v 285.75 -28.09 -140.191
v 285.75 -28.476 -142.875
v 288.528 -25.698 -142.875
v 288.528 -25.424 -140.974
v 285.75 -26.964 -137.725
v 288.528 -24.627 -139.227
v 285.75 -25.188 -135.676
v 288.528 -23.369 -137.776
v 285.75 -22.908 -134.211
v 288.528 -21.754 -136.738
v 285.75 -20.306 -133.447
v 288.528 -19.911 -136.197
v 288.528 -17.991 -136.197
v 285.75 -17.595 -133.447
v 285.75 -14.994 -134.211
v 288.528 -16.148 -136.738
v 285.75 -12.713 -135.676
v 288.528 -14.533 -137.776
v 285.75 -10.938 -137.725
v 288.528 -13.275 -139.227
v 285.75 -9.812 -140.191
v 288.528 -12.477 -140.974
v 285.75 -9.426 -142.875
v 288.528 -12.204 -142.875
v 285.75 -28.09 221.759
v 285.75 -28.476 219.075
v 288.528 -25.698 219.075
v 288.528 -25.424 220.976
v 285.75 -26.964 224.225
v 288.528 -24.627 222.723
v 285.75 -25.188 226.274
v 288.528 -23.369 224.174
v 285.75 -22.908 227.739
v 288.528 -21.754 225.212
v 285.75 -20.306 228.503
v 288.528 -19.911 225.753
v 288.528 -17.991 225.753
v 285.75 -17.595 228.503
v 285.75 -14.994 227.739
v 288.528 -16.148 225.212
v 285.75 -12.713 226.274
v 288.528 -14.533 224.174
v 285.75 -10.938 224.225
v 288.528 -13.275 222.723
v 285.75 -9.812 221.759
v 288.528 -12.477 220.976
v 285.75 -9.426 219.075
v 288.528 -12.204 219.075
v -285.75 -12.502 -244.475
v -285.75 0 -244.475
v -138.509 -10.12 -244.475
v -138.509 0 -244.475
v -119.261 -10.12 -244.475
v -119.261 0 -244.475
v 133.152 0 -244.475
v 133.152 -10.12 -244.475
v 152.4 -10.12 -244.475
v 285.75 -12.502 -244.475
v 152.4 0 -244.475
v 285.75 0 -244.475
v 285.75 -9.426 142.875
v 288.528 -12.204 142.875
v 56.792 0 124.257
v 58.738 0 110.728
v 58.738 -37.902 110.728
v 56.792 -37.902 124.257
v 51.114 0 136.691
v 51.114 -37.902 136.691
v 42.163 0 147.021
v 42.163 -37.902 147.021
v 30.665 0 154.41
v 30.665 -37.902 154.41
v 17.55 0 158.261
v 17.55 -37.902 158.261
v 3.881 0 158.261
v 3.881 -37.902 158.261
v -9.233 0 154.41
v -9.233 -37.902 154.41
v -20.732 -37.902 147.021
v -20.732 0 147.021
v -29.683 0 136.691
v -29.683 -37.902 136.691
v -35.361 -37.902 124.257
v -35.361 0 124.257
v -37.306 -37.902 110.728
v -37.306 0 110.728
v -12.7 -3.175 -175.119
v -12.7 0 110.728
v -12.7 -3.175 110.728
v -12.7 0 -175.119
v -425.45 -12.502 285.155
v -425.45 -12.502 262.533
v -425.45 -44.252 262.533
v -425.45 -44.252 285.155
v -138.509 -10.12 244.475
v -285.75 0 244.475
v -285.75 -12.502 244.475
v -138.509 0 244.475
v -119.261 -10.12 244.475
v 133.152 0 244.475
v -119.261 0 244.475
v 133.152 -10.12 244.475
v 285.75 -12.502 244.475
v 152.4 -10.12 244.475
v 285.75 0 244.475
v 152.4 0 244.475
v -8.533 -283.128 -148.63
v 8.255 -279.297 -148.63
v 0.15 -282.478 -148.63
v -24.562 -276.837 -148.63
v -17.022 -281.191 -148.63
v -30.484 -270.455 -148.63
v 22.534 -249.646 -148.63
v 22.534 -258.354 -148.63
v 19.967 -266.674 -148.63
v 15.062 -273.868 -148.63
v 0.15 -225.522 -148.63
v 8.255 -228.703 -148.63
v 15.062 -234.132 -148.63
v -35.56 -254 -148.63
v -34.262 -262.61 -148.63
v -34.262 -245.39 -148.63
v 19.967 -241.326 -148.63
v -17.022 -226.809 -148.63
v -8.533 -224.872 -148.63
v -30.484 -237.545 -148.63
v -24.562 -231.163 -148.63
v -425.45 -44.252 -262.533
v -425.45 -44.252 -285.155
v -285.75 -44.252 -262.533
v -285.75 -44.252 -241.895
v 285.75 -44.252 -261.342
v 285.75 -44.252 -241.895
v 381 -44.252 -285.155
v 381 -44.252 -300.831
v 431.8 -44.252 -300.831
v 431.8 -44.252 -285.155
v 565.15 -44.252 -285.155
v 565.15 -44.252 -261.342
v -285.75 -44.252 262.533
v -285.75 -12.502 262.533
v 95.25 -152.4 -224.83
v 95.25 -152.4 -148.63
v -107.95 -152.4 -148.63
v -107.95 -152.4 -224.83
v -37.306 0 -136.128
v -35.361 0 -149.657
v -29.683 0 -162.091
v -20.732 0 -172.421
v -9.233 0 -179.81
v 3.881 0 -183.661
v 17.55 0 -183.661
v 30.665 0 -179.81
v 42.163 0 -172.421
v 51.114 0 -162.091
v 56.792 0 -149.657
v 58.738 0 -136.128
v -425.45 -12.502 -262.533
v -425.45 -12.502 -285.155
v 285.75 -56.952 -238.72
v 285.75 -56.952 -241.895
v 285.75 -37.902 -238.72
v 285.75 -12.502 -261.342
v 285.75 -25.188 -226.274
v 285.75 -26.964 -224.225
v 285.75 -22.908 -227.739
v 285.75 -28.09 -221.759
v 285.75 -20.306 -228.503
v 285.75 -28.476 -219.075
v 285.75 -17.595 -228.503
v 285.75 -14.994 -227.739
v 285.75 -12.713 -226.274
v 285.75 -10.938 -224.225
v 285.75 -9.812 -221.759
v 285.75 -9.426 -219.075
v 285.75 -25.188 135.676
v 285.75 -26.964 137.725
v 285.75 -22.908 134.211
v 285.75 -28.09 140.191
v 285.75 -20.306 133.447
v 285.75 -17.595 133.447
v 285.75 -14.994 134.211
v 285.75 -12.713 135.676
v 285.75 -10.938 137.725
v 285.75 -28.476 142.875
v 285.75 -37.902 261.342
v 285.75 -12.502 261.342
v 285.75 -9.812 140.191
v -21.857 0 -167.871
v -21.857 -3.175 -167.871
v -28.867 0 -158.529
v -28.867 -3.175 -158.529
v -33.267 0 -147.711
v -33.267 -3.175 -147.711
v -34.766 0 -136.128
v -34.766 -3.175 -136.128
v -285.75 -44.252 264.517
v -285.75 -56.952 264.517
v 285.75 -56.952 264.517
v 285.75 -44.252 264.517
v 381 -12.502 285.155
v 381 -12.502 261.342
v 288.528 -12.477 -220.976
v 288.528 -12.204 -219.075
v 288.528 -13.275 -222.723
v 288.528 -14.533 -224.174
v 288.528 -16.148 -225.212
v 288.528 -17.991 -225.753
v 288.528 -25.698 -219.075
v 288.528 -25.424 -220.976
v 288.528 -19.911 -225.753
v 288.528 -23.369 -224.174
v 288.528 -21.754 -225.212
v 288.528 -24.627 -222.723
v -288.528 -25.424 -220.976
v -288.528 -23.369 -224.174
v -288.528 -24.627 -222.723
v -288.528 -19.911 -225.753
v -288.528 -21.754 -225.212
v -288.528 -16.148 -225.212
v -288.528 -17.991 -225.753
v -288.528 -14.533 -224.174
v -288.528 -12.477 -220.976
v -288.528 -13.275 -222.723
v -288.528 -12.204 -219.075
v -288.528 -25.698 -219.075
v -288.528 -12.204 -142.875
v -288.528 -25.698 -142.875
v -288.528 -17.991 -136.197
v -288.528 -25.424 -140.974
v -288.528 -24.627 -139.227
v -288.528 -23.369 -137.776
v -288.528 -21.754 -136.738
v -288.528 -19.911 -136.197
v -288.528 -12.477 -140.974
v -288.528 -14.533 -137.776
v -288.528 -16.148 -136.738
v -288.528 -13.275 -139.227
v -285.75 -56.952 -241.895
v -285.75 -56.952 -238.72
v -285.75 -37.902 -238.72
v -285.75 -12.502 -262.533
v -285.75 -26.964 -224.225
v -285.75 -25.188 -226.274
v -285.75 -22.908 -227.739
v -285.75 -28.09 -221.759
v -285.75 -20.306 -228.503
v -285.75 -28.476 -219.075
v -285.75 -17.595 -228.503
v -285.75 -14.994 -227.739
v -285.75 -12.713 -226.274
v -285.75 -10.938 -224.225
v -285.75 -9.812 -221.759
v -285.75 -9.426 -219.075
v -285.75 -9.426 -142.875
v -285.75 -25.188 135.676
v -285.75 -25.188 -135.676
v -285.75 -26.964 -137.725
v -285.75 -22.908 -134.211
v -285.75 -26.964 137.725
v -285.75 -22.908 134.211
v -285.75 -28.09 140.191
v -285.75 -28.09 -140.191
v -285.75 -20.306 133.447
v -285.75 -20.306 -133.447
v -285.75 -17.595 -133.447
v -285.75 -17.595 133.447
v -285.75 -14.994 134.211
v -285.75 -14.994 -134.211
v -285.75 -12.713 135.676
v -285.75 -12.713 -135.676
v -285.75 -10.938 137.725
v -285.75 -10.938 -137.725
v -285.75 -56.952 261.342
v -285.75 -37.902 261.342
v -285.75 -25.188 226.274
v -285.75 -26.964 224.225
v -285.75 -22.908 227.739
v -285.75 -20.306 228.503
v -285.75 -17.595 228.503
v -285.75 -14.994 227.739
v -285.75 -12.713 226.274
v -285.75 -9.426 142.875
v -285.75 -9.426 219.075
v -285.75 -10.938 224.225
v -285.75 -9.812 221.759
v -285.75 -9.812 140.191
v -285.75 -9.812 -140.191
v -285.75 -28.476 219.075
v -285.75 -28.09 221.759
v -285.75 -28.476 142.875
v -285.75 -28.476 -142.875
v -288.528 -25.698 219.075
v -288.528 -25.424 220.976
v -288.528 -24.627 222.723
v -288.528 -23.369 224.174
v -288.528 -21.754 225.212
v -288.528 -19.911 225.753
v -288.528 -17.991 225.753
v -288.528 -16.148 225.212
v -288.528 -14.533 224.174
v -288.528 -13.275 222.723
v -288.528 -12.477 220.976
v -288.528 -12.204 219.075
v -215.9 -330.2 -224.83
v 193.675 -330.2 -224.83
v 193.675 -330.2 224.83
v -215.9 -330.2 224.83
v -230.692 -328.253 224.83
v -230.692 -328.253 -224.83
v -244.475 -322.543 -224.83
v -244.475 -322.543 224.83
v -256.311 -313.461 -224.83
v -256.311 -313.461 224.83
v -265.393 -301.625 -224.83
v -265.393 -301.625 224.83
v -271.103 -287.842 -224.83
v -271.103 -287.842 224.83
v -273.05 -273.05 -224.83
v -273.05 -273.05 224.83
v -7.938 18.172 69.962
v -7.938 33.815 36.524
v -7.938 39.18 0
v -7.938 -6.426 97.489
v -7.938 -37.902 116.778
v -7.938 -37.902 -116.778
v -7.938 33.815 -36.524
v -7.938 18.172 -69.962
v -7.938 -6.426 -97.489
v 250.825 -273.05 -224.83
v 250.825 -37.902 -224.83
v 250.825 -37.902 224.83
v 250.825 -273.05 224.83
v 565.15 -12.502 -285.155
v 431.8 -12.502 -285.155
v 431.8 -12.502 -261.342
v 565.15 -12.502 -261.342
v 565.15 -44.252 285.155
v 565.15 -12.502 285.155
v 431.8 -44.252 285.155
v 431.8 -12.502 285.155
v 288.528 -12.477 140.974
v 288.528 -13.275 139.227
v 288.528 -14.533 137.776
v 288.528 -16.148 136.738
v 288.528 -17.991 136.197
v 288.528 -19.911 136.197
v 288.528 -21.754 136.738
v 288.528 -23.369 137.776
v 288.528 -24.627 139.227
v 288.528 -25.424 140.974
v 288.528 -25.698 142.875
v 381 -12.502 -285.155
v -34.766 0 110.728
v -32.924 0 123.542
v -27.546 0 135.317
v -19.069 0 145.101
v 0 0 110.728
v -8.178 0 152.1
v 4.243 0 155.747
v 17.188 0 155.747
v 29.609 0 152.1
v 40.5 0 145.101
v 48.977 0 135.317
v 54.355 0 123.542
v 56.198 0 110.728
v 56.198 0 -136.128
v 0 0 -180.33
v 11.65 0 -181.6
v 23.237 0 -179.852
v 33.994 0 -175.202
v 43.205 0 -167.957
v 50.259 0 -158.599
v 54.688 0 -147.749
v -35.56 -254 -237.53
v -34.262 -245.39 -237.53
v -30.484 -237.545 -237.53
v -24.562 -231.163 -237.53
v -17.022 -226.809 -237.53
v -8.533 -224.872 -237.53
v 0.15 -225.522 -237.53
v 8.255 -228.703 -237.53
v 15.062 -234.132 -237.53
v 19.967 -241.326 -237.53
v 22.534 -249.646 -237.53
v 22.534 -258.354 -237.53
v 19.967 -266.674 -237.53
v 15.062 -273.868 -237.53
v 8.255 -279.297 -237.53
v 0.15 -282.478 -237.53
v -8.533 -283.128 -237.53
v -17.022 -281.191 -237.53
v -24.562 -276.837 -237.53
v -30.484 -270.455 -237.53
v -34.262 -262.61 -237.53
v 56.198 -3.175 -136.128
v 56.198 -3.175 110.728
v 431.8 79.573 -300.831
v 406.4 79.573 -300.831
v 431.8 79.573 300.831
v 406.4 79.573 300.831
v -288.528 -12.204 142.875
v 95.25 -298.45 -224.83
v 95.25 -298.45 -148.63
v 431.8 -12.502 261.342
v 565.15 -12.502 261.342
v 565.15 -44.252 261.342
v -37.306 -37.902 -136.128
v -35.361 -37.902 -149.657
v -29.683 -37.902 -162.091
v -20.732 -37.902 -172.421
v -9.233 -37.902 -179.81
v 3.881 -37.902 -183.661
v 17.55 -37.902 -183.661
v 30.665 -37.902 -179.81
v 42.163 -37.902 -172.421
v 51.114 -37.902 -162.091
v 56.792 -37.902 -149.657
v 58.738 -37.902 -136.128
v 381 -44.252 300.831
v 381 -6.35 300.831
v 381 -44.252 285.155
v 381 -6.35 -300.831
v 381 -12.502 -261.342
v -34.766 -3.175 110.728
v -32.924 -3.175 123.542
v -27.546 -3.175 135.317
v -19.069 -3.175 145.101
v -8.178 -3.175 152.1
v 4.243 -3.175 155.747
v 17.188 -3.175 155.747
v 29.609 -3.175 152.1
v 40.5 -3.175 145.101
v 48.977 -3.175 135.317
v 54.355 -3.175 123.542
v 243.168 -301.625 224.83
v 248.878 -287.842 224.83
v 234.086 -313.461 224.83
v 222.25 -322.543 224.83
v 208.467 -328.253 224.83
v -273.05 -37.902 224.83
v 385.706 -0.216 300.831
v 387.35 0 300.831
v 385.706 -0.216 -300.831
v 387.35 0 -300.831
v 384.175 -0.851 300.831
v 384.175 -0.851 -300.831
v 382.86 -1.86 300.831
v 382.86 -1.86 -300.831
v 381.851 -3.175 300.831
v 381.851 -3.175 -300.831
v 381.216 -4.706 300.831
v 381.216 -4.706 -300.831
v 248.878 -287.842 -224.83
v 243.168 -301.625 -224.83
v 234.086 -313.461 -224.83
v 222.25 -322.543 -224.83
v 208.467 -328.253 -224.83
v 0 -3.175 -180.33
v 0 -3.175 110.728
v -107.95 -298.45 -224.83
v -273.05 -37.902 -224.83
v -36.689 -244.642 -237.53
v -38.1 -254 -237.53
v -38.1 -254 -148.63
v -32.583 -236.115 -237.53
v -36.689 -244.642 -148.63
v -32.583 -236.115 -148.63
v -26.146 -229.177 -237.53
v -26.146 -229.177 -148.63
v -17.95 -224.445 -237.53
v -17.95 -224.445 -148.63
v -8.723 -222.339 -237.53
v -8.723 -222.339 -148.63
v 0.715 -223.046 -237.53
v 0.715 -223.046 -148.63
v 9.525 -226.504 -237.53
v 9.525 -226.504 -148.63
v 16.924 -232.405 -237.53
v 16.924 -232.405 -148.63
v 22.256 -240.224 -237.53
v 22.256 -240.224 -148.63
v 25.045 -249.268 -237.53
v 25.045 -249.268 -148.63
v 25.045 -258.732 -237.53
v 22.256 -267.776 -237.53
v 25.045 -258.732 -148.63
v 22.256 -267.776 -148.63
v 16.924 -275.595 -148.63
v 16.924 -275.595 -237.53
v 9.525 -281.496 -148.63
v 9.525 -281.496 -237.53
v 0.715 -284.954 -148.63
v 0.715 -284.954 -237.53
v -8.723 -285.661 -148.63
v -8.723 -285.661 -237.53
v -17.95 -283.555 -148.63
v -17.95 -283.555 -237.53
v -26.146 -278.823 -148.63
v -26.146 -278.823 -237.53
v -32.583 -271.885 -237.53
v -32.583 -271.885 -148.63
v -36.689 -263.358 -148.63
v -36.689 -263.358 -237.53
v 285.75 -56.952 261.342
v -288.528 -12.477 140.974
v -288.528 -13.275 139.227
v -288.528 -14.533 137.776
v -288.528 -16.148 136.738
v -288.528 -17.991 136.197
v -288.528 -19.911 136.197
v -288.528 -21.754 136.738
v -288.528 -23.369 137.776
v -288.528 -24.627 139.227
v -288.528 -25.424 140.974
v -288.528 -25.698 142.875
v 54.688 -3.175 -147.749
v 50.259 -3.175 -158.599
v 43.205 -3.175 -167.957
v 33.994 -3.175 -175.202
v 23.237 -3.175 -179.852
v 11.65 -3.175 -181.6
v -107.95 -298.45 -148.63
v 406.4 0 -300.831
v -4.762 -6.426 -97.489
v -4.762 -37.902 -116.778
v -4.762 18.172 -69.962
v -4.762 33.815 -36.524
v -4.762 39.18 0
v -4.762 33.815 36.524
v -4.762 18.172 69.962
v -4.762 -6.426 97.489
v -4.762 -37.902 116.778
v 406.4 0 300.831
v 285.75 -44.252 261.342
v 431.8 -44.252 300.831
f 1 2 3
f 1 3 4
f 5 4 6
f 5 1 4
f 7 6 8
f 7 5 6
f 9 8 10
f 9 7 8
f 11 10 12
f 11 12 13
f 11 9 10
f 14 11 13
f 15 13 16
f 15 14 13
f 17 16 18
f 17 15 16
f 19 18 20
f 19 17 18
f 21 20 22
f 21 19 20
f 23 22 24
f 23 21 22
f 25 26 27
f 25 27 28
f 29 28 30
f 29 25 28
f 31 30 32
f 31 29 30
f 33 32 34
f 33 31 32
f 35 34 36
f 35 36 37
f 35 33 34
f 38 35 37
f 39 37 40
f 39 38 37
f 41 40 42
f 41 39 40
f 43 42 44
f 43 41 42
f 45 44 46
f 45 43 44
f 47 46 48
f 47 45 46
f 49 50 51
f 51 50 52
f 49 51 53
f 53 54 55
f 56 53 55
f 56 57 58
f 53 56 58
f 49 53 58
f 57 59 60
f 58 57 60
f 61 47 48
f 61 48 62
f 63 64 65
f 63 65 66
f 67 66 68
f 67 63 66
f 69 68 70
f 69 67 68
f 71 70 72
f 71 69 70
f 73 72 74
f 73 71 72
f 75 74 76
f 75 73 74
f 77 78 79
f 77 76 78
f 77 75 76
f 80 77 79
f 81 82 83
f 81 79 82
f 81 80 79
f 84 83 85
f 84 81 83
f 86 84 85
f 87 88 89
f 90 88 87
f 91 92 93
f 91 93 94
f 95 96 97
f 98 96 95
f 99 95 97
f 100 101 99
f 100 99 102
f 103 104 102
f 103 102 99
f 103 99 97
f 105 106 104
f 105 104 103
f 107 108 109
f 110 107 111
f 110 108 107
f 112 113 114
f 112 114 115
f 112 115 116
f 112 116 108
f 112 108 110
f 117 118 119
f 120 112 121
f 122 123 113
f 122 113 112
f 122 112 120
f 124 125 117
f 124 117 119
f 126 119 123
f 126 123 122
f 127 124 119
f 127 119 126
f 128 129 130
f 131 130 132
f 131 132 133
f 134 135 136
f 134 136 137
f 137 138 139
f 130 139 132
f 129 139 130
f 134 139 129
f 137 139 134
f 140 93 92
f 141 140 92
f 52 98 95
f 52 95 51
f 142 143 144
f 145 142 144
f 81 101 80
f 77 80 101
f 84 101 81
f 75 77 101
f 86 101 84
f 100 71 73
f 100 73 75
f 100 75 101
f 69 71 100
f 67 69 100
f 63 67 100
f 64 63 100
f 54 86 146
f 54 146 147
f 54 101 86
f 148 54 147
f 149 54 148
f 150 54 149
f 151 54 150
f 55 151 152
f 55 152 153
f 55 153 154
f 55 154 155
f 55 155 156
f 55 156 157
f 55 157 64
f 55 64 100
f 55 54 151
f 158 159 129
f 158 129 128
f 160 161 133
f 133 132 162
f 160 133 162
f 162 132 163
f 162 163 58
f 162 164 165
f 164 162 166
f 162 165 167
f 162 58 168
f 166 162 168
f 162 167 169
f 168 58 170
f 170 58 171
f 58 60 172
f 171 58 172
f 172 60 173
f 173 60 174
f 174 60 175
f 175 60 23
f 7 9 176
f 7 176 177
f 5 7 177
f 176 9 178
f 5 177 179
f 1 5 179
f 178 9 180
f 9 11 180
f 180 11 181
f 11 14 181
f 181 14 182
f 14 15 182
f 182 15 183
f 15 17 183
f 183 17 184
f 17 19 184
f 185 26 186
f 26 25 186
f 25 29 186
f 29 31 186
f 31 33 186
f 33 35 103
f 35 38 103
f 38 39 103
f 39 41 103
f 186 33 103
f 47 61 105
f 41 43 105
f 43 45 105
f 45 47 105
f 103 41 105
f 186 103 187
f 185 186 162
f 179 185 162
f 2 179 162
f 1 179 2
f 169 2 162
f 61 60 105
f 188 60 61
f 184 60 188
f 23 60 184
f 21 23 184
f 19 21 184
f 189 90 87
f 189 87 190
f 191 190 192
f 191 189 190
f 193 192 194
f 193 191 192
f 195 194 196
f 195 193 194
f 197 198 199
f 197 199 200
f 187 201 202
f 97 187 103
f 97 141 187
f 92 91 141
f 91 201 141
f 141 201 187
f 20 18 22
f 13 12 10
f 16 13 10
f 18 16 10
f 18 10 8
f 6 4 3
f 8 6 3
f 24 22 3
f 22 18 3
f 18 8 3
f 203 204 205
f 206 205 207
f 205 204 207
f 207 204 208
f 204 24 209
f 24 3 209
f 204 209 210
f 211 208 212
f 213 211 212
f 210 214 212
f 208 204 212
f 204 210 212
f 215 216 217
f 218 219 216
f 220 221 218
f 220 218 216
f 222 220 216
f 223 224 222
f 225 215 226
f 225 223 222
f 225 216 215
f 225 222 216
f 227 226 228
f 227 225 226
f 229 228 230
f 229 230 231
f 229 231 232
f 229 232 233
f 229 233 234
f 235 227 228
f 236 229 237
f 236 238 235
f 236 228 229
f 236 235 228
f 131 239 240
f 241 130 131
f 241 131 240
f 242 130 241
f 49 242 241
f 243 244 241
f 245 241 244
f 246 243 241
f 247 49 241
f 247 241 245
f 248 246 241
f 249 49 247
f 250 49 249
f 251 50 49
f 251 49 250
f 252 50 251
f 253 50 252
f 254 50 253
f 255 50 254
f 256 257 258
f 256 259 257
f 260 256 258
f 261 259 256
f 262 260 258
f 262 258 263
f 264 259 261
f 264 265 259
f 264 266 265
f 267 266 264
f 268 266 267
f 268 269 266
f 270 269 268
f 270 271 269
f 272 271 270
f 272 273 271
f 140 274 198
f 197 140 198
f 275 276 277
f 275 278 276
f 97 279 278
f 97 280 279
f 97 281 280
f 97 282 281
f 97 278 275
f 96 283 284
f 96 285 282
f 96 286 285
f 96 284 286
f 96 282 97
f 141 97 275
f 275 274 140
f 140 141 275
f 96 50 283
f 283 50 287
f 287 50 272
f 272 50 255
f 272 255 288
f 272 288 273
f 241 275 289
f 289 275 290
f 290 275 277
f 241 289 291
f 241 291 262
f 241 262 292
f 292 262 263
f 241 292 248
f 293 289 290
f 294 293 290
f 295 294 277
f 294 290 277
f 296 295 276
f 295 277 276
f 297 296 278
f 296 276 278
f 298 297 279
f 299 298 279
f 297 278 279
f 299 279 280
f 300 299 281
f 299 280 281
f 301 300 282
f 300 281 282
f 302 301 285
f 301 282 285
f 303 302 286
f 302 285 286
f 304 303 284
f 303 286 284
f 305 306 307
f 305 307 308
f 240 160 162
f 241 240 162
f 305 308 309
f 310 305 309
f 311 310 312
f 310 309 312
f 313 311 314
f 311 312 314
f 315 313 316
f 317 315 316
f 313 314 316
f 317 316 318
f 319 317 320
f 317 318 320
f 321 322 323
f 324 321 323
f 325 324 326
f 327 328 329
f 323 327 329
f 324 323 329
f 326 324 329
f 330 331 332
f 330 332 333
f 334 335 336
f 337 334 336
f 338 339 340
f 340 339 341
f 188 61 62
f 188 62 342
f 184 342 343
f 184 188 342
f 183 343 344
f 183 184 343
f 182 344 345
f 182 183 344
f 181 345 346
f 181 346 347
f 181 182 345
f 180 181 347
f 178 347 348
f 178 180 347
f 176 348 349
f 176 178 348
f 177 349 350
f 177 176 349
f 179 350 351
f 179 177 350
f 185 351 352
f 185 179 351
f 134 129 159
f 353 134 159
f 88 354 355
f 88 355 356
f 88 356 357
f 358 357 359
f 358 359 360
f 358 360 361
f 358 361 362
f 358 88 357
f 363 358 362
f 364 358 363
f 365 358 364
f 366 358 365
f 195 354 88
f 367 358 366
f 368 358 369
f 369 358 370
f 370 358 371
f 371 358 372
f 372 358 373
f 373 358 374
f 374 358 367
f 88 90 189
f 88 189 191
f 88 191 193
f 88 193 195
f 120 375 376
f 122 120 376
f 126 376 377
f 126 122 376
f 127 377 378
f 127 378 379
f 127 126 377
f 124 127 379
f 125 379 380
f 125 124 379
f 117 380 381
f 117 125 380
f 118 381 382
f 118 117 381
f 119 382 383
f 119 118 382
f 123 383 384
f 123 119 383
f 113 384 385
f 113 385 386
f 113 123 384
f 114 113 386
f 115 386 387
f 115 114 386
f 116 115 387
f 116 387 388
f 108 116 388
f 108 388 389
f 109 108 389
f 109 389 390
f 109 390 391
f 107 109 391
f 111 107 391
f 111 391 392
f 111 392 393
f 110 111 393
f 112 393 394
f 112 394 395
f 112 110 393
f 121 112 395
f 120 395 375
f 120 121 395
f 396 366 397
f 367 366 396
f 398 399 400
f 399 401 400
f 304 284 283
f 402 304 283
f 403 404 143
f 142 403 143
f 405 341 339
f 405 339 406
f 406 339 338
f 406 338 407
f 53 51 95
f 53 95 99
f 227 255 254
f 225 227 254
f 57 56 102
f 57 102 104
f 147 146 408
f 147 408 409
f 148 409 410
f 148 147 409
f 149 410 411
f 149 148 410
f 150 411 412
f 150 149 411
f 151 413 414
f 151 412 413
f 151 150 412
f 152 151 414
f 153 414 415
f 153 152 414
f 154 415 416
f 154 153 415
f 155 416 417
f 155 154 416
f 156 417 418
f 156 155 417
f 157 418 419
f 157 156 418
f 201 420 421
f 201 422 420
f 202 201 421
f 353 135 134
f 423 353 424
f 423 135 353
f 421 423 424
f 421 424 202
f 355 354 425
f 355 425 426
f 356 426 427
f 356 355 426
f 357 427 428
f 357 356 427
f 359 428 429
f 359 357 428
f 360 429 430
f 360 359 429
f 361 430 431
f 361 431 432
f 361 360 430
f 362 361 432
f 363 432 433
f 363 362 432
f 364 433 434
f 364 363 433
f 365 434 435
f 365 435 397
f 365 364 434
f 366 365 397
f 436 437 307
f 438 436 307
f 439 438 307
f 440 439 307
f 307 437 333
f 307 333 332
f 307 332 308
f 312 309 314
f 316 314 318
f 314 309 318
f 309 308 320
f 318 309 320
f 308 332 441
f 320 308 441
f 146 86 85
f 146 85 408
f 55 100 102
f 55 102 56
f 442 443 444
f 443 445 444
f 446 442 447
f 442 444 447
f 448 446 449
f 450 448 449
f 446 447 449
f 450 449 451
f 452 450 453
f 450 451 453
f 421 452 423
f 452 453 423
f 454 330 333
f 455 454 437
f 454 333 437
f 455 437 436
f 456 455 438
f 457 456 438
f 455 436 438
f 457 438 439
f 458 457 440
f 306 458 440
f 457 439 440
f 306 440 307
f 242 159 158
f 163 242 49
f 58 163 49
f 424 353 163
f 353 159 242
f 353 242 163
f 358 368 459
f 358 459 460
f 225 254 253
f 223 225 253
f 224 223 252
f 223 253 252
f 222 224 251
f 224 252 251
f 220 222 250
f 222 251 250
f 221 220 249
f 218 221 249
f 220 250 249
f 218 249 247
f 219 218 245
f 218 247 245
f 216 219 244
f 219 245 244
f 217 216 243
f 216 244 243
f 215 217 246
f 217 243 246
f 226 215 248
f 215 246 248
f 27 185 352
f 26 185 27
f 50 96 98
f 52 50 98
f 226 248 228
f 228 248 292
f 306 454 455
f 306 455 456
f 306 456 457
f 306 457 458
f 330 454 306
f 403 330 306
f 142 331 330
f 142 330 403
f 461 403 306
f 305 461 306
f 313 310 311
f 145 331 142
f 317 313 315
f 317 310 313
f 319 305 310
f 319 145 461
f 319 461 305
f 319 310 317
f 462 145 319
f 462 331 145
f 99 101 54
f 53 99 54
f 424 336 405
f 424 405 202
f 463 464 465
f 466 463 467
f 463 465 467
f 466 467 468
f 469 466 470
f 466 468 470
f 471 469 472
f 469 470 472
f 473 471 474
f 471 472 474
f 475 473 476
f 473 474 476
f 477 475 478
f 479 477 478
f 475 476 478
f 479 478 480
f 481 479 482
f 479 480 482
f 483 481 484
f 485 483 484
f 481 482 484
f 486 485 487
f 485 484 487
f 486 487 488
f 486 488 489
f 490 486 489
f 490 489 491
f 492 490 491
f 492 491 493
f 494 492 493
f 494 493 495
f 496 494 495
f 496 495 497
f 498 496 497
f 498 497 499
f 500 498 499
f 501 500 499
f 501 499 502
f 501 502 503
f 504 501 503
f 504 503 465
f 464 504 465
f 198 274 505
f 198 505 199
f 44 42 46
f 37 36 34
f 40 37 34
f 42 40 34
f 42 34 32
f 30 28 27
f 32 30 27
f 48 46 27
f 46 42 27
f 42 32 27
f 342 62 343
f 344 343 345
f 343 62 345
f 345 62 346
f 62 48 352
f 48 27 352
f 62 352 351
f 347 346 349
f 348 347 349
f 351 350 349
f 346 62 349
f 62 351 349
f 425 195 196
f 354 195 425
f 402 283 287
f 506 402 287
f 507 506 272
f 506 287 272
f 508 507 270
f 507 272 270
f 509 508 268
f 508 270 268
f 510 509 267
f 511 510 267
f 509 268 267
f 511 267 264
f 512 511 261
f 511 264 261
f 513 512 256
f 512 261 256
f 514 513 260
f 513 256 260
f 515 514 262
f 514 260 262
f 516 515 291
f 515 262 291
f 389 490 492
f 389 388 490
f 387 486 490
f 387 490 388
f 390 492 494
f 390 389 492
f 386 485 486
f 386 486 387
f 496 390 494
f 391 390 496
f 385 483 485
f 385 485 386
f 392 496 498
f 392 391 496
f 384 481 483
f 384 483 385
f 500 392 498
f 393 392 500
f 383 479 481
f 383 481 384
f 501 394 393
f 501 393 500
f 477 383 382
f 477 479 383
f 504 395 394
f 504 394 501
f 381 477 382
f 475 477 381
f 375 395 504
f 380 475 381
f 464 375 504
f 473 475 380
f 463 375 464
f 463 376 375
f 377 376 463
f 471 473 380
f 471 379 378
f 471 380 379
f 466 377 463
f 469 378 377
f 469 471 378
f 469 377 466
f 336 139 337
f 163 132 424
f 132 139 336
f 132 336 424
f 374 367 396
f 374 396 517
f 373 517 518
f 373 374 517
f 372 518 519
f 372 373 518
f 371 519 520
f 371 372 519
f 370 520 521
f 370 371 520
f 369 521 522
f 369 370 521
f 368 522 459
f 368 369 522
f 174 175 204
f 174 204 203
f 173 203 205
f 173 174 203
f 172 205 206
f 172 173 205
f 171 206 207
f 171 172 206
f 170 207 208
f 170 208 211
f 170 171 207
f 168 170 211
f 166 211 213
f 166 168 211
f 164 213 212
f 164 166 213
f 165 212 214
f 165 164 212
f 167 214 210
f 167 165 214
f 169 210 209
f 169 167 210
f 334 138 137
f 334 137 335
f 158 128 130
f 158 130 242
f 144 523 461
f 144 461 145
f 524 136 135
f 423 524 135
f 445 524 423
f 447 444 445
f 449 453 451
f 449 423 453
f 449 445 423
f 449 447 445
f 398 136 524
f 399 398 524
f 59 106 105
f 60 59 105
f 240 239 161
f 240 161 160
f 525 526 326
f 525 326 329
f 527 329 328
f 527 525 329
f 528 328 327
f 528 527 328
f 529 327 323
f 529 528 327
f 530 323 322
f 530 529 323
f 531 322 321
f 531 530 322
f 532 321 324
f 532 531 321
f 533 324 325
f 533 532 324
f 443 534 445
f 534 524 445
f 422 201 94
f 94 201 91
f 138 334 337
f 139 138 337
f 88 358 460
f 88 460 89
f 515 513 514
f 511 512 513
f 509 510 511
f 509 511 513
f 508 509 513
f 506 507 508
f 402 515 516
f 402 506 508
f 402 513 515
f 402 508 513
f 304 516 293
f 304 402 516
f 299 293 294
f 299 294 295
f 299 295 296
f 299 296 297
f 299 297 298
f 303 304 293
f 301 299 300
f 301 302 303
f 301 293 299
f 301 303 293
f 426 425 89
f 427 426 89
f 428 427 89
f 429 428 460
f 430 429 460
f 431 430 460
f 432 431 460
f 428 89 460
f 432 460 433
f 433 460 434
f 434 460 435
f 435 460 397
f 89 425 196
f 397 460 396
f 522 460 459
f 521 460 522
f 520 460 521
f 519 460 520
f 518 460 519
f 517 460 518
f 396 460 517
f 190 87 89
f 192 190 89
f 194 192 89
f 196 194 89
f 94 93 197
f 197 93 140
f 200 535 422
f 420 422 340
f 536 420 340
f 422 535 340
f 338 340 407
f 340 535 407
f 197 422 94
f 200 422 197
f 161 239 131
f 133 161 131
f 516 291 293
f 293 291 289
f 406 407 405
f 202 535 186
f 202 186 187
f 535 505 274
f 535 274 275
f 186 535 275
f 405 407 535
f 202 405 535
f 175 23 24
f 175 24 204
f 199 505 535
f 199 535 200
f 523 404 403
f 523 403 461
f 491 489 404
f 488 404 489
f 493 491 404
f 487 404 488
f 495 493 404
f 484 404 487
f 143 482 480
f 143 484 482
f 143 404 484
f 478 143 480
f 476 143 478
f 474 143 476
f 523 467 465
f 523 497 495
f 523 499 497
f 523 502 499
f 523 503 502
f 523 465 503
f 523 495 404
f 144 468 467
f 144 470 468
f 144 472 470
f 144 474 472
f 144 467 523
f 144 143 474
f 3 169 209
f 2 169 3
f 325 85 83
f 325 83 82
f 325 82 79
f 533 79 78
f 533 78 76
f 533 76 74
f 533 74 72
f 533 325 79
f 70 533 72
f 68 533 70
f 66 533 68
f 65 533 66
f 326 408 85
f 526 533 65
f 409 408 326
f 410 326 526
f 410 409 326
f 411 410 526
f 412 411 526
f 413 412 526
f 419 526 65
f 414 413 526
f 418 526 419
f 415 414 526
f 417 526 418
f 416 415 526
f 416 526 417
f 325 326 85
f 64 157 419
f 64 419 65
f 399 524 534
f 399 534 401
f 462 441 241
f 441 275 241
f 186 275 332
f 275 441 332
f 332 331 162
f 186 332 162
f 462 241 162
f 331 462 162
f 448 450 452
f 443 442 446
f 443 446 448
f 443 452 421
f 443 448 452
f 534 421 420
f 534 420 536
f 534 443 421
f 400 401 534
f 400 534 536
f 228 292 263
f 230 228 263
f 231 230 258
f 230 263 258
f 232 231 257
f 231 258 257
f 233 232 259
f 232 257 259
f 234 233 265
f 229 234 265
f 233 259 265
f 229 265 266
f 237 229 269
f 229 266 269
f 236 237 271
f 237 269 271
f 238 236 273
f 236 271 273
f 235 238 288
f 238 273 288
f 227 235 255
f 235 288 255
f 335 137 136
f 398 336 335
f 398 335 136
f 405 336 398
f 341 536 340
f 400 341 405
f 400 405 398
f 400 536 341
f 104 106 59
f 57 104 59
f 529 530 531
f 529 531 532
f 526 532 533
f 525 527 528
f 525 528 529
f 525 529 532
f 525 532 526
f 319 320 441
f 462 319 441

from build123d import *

# Parameters (mm, degrees)
SKETCH1_W                = 571.5
SKETCH1_H                = 488.95
EXTRUDE1_DEPTH           = 37.9015625
SKETCH2_W                = 571.5
SKETCH2_H                = 40.6796875
SKETCH2_H_2              = 18.0578125
EXTRUDE5_DEPTH           = 25.4
SKETCH6_W                = 23.8125
SKETCH6_H                = 31.75
EXTRUDE6_DEPTH           = 571.5
SKETCH7_W                = 3.175
SKETCH7_H                = 12.7
EXTRUDE7_DEPTH           = 571.5
EXTRUDE8_DEPTH           = 2.778125
EXTRUDE8_DRAFT           = 45
EXTRUDE8_PROFILE_2_DEPTH = 2.778125
EXTRUDE8_PROFILE_2_DRAFT = 45
MIRROR2_COPY_1_DEPTH     = 2.778125
MIRROR2_COPY_1_DRAFT     = 45
MIRROR2_COPY_2_DEPTH     = 2.778125
MIRROR2_COPY_2_DRAFT     = 45
MIRROR2_COPY_3_DEPTH     = 2.778125
MIRROR2_COPY_3_DRAFT     = 45
EXTRUDE9_DEPTH           = 490.247968132
SKETCH10_W               = 19.2484375
SKETCH10_H               = 488.95
EXTRUDE10_DEPTH          = 10.1203125
SKETCH3_W                = 23.8125
SKETCH3_H                = 31.75
EXTRUDE3_DEPTH           = 565.15
EXTRUDE4_REACH           = 806.917
SKETCH11_W               = 25.4
SKETCH11_H               = 123.825
EXTRUDE11_DEPTH          = 15.6765625
SKETCH12_W               = 25.4
SKETCH12_H               = 44.2515625
EXTRUDE12_DEPTH          = 15.6765625
SKETCH13_W               = 25.4
SKETCH13_H               = 44.2515625
EXTRUDE13_DEPTH          = 15.6765625
FILLET1_R                = 6.35
EXTRUDE14_DEPTH          = 224.8296875
SKETCH15_R               = 127
EXTRUDE15_DEPTH          = 1.5875
EXTRUDE16_DEPTH          = 3.175
SKETCH17_R               = 31.75
SKETCH17_R_2             = 29.21
EXTRUDE17_DEPTH          = 12.7
EXTRUDE18_START          = -76.2
SKETCH18_W               = 203.2
SKETCH18_H               = 146.05
SKETCH18_R               = 31.75
SKETCH18_R_2             = 29.21
EXTRUDE18_DEPTH          = 76.2
EXTRUDE20_START          = -285.75
SKETCH20_W               = 22.621875
SKETCH20_H               = 31.75
EXTRUDE20_DEPTH          = 425.45


with BuildPart() as part:
    # Sketch1 → Extrude1 (new body)
    with BuildSketch(Plane(origin=(0, 0, 0), x_dir=(1, 0, 0), z_dir=(0, 1, 0))):
        Rectangle(SKETCH1_W, SKETCH1_H)
    extrude(amount=-EXTRUDE1_DEPTH)

    # Sketch2 → Extrude5 (add)
    with BuildSketch(Plane(origin=(0, -37.9015625, 0), x_dir=(1, 0, 0), z_dir=(0, 1, 0))):
        with Locations((0, -264.81484375)):
            Rectangle(SKETCH2_W, SKETCH2_H)
        with Locations((0, 253.50390625)):
            Rectangle(SKETCH2_W, SKETCH2_H_2)
    extrude(amount=EXTRUDE5_DEPTH)

    # Sketch6 → Extrude6 (add)
    with BuildSketch(Plane.ZY.offset(285.75)):
        with Locations((273.2484375, -28.3765625)):
            Rectangle(SKETCH6_W, SKETCH6_H)
        with Locations((-250.6265625, -28.3765625)):
            Rectangle(SKETCH6_W, SKETCH6_H)
    extrude(amount=-EXTRUDE6_DEPTH)

    # Sketch7 → Extrude7 (add)
    with BuildSketch(Plane.ZY.offset(285.75)):
        with Locations((262.9296875, -50.6015625)):
            Rectangle(SKETCH7_W, SKETCH7_H)
        with Locations((-240.3078125, -50.6015625)):
            Rectangle(SKETCH7_W, SKETCH7_H)
    extrude(amount=-EXTRUDE7_DEPTH)


with BuildPart() as extrude8_tool:
    # Sketch8 → Extrude8 (with draft: the straight prism first)
    with BuildSketch(Plane.ZY.offset(285.75)):
        with BuildLine():
            Line((-219.075, -28.47578125), (-142.875, -28.47578125))
            ThreePointArc((-142.875, -28.47578125), (-133.35, -18.95078125), (-142.875, -9.42578125))
            Line((-142.875, -9.42578125), (-219.075, -9.42578125))
            ThreePointArc((-219.075, -9.42578125), (-228.6, -18.95078125), (-219.075, -28.47578125))
        make_face()
    extrude(amount=EXTRUDE8_DEPTH)
    # Extrude8: the draft: its side faces are tilted about the plane it starts from
    extrude8_sides = [extrude8_tool.faces().sort_by_distance(p)[0] for p in [
        (-287.1390625, -18.95078125, -228.6),
        (-287.1390625, -28.47578125, -180.975),
        (-287.1390625, -18.95078125, -133.35),
        (-287.1390625, -9.42578125, -180.975),
    ]]
    draft(extrude8_sides, Plane.ZY.offset(285.75), EXTRUDE8_DRAFT)


with BuildPart() as part_1:
    add(part.part)

    # Extrude8: add extrude8_tool
    add(extrude8_tool.part)


with BuildPart() as extrude8_profile_2_tool:
    # Sketch8 → Extrude8 profile 2 (with draft: the straight prism first)
    with BuildSketch(Plane.ZY.offset(285.75)):
        with BuildLine():
            Line((142.875, -28.47578125), (219.075, -28.47578125))
            ThreePointArc((219.075, -28.47578125), (228.6, -18.95078125), (219.075, -9.42578125))
            Line((219.075, -9.42578125), (142.875, -9.42578125))
            ThreePointArc((142.875, -9.42578125), (133.35, -18.95078125), (142.875, -28.47578125))
        make_face()
    extrude(amount=EXTRUDE8_PROFILE_2_DEPTH)
    # Extrude8 profile 2: the draft: its side faces are tilted about the plane it starts from
    extrude8_profile_2_sides = [extrude8_profile_2_tool.faces().sort_by_distance(p)[0] for p in [
        (-287.1390625, -18.95078125, 133.35),
        (-287.1390625, -28.47578125, 180.975),
        (-287.1390625, -18.95078125, 228.6),
        (-287.1390625, -9.42578125, 180.975),
    ]]
    draft(extrude8_profile_2_sides, Plane.ZY.offset(285.75), EXTRUDE8_PROFILE_2_DRAFT)


with BuildPart() as part_2:
    add(part_1.part)

    # Extrude8 profile 2: add extrude8_profile_2_tool
    add(extrude8_profile_2_tool.part)


with BuildPart() as mirror2_copy_1_tool:
    # Mirror2 copy 1 sketch → Mirror2 copy 1 (with draft: the straight prism first)
    with BuildSketch(Plane(origin=(285.75, 0, 0), x_dir=(0, 0, 1), z_dir=(1, 0, 0))):
        with BuildLine():
            Line((-219.075, 28.47578125), (-142.875, 28.47578125))
            ThreePointArc((-142.875, 28.47578125), (-133.35, 18.95078125), (-142.875, 9.42578125))
            Line((-142.875, 9.42578125), (-219.075, 9.42578125))
            ThreePointArc((-219.075, 9.42578125), (-228.6, 18.95078125), (-219.075, 28.47578125))
        make_face()
    extrude(amount=MIRROR2_COPY_1_DEPTH)
    # Mirror2 copy 1: the draft: its side faces are tilted about the plane it starts from
    mirror2_copy_1_sides = [mirror2_copy_1_tool.faces().sort_by_distance(p)[0] for p in [
        (287.1390625, -18.95078125, -228.6),
        (287.1390625, -28.47578125, -180.975),
        (287.1390625, -18.95078125, -133.35),
        (287.1390625, -9.42578125, -180.975),
    ]]
    draft(mirror2_copy_1_sides, Plane(origin=(285.75, 0, 0), x_dir=(0, 0, 1), z_dir=(1, 0, 0)), MIRROR2_COPY_1_DRAFT)


with BuildPart() as part_3:
    add(part_2.part)

    # Mirror2 copy 1: add mirror2_copy_1_tool
    add(mirror2_copy_1_tool.part)


with BuildPart() as mirror2_copy_2_tool:
    # Mirror2 copy 2 sketch → Mirror2 copy 2 (with draft: the straight prism first)
    with BuildSketch(Plane(origin=(285.75, 0, 0), x_dir=(0, 0, 1), z_dir=(1, 0, 0))):
        with BuildLine():
            Line((142.875, 28.47578125), (219.075, 28.47578125))
            ThreePointArc((219.075, 28.47578125), (228.6, 18.95078125), (219.075, 9.42578125))
            Line((219.075, 9.42578125), (142.875, 9.42578125))
            ThreePointArc((142.875, 9.42578125), (133.35, 18.95078125), (142.875, 28.47578125))
        make_face()
    extrude(amount=MIRROR2_COPY_2_DEPTH)
    # Mirror2 copy 2: the draft: its side faces are tilted about the plane it starts from
    mirror2_copy_2_sides = [mirror2_copy_2_tool.faces().sort_by_distance(p)[0] for p in [
        (287.1390625, -18.95078125, 133.35),
        (287.1390625, -28.47578125, 180.975),
        (287.1390625, -18.95078125, 228.6),
        (287.1390625, -9.42578125, 180.975),
    ]]
    draft(mirror2_copy_2_sides, Plane(origin=(285.75, 0, 0), x_dir=(0, 0, 1), z_dir=(1, 0, 0)), MIRROR2_COPY_2_DRAFT)


with BuildPart() as part_4:
    add(part_3.part)

    # Mirror2 copy 2: add mirror2_copy_2_tool
    add(mirror2_copy_2_tool.part)


with BuildPart() as mirror2_copy_3_tool:
    # Mirror2 copy 3 sketch → Mirror2 copy 3 (with draft: the straight prism first)
    with BuildSketch(Plane(origin=(285.75, 0, 0), x_dir=(0, 0, 1), z_dir=(1, 0, 0))):
        with BuildLine():
            Line((142.875, 28.47578125), (219.075, 28.47578125))
            ThreePointArc((219.075, 28.47578125), (228.6, 18.95078125), (219.075, 9.42578125))
            Line((219.075, 9.42578125), (142.875, 9.42578125))
            ThreePointArc((142.875, 9.42578125), (133.35, 18.95078125), (142.875, 28.47578125))
        make_face()
    extrude(amount=MIRROR2_COPY_3_DEPTH)
    # Mirror2 copy 3: the draft: its side faces are tilted about the plane it starts from
    mirror2_copy_3_sides = [mirror2_copy_3_tool.faces().sort_by_distance(p)[0] for p in [
        (287.1390625, -18.95078125, 133.35),
        (287.1390625, -28.47578125, 180.975),
        (287.1390625, -18.95078125, 228.6),
        (287.1390625, -9.42578125, 180.975),
    ]]
    draft(mirror2_copy_3_sides, Plane(origin=(285.75, 0, 0), x_dir=(0, 0, 1), z_dir=(1, 0, 0)), MIRROR2_COPY_3_DRAFT)


with BuildPart() as part_5:
    add(part_4.part)

    # Mirror2 copy 3: add mirror2_copy_3_tool
    add(mirror2_copy_3_tool.part)

    # Sketch9 → Extrude9 (cut, through all)
    with BuildSketch(Plane(origin=(56.753125, 0, -56.753125), x_dir=(0, 0, -1), z_dir=(0, 1, 0))):
        with BuildLine():
            Line((-167.48125, 94.059375), (79.375, 94.059375))
            ThreePointArc((79.375, 94.059375), (127.396875, 46.0375), (79.375, -1.984375))
            Line((79.375, -1.984375), (-167.48125, -1.984375))
            ThreePointArc((-167.48125, -1.984375), (-215.503125, 46.0375), (-167.48125, 94.059375))
        make_face()
    extrude(amount=-EXTRUDE9_DEPTH, mode=Mode.SUBTRACT)

    # Sketch10 → Extrude10 (cut)
    with BuildSketch(Plane(origin=(0, 0, 0), x_dir=(1, 0, 0), z_dir=(0, 1, 0))):
        with Locations((-128.88515625, 0)):
            Rectangle(SKETCH10_W, SKETCH10_H)
        with Locations((142.77578125, 0)):
            Rectangle(SKETCH10_W, SKETCH10_H)
    extrude(amount=-EXTRUDE10_DEPTH, mode=Mode.SUBTRACT)

    # Sketch3 → Extrude3 (add)
    with BuildSketch(Plane(origin=(0, 0, 0), x_dir=(0, 0, -1), z_dir=(1, 0, 0))):
        with Locations((-273.2484375, -28.3765625)):
            Rectangle(SKETCH3_W, SKETCH3_H)
    extrude3 = extrude(amount=EXTRUDE3_DEPTH)

    # Mirror1: Extrude3 across plane
    add(extrude3.mirror(Plane.XY))

    # Extrude4: up to this face of the body (flat: up to its plane)
    extrude4_end = Plane(part_5.part.faces().sort_by_distance((282.575, -28.3765625, -285.1546875))[0])
    # Sketch4 → Extrude4 (add, up to the picked face)
    with BuildSketch(Plane.XY.offset(285.1546875), mode=Mode.PRIVATE) as extrude4_sk1:
        Polygon((381, 0), (406.4, 0), (406.4, 79.5734375), (431.8, 79.5734375), (431.8, -12.5015625), (381, -12.5015625), align=None)
    extrude4_tool1 = split(extrude(extrude4_sk1.sketch, amount=-EXTRUDE4_REACH, mode=Mode.PRIVATE), bisect_by=extrude4_end, keep=Keep.BOTH, mode=Mode.PRIVATE)
    add(extrude4_tool1.solids().sort_by(Axis((416.063567, 28.77965, 285.154688), (0, 0, -1)))[0])

    # Sketch11 → Extrude11 (add)
    with BuildSketch(Plane.XY.offset(285.1546875)):
        with Locations((419.1, 17.6609375)):
            Rectangle(SKETCH11_W, SKETCH11_H)
    extrude11 = extrude(amount=EXTRUDE11_DEPTH)

    # Mirror3: Extrude11 across plane
    add(extrude11.mirror(Plane.XY))

    # Sketch12 → Extrude12 (add)
    with BuildSketch(Plane.XY.offset(285.1546875)):
        with Locations((393.7, -22.12578125)):
            Rectangle(SKETCH12_W, SKETCH12_H)
    extrude(amount=EXTRUDE12_DEPTH)

    # Sketch13 → Extrude13 (add)
    with BuildSketch(Plane(origin=(0, 0, -300.83125), x_dir=(-1, 0, 0), z_dir=(0, 0, -1))):
        with Locations((-393.7, -22.12578125)):
            Rectangle(SKETCH13_W, SKETCH13_H)
    extrude(amount=-EXTRUDE13_DEPTH)

    # Fillet1
    fillet1_edges = [part_5.edges().sort_by_distance(p)[0] for p in [
        (381, 0, 0),
    ]]
    fillet(fillet1_edges, radius=FILLET1_R)

    # Sketch14 → Extrude14 (add)
    with BuildSketch(Plane.XY.offset(224.8296875)):
        with BuildLine():
            Line((-273.05, -37.9015625), (250.825, -37.9015625))
            Line((250.825, -37.9015625), (250.825, -273.05))
            ThreePointArc((250.825, -273.05), (234.086152545, -313.461152545), (193.675, -330.2))
            Line((193.675, -330.2), (-215.9, -330.2))
            ThreePointArc((-215.9, -330.2), (-256.311152545, -313.461152545), (-273.05, -273.05))
            Line((-273.05, -273.05), (-273.05, -37.9015625))
        make_face()
    extrude14 = extrude(amount=-EXTRUDE14_DEPTH)

    # Mirror6: Extrude14 across plane
    add(extrude14.mirror(Plane.XY))

    # Sketch15 → Extrude15 (add, symmetric)
    with BuildSketch(Plane(origin=(-6.35, 0, 0), x_dir=(0, 0, -1), z_dir=(1, 0, 0))):
        with Locations((0, -87.820142217)):
            Circle(SKETCH15_R)
    extrude(amount=EXTRUDE15_DEPTH, both=True)

    # Sketch17 → Extrude17 (add)
    with BuildSketch(Plane(origin=(0, 0, -224.8296875), x_dir=(-1, 0, 0), z_dir=(0, 0, -1))):
        with Locations((6.35, -254)):
            Circle(SKETCH17_R)
        with Locations((6.35, -254)):
            Circle(SKETCH17_R_2, mode=Mode.SUBTRACT)
    extrude(amount=EXTRUDE17_DEPTH)

    # Sketch18 → Extrude18 (cut)
    # profile 1 of 2: a face of its own
    with BuildSketch(Plane(origin=(0, 0, -224.8296875), x_dir=(-1, 0, 0), z_dir=(0, 0, -1)).offset(EXTRUDE18_START)):
        with Locations((6.35, -225.425)):
            Rectangle(SKETCH18_W, SKETCH18_H)
        with Locations((6.35, -254)):
            Circle(SKETCH18_R, mode=Mode.SUBTRACT)
    # profile 2 of 2: a face of its own
    with BuildSketch(Plane(origin=(0, 0, -224.8296875), x_dir=(-1, 0, 0), z_dir=(0, 0, -1)).offset(EXTRUDE18_START)):
        with Locations((6.35, -254)):
            Circle(SKETCH18_R_2)
    extrude(amount=EXTRUDE18_DEPTH, mode=Mode.SUBTRACT)

    # Sketch20 → Extrude20 (add)
    with BuildSketch(Plane.ZY.offset(285.75).offset(EXTRUDE20_START)):
        with Locations((-273.84375, -28.3765625)):
            Rectangle(SKETCH20_W, SKETCH20_H)
        with Locations((273.84375, -28.3765625)):
            Rectangle(SKETCH20_W, SKETCH20_H)
    extrude(amount=EXTRUDE20_DEPTH)


with BuildPart() as body_2:
    # Sketch16 → Extrude16 (new body)
    with BuildSketch(Plane(origin=(0, 0, 0), x_dir=(1, 0, 0), z_dir=(0, 1, 0))):
        with BuildLine():
            Line((-34.76625, 136.128125), (-34.76625, -110.728125))
            ThreePointArc((-34.76625, -110.728125), (10.715625, -156.21), (56.1975, -110.728125))
            Line((56.1975, -110.728125), (56.1975, 136.128125))
            ThreePointArc((56.1975, 136.128125), (38.833539545, 171.877024775), (0, 180.329667217))
            Line((0, 180.329667217), (0, -110.728125))
            Line((0, -110.728125), (-12.7, -110.728125))
            Line((-12.7, -110.728125), (-12.7, 175.11927091))
            ThreePointArc((-12.7, 175.11927091), (-28.867120501, 158.529178817), (-34.76625, 136.128125))
        make_face()
    extrude(amount=-EXTRUDE16_DEPTH)


solid = Compound([part_5.part, body_2.part])
